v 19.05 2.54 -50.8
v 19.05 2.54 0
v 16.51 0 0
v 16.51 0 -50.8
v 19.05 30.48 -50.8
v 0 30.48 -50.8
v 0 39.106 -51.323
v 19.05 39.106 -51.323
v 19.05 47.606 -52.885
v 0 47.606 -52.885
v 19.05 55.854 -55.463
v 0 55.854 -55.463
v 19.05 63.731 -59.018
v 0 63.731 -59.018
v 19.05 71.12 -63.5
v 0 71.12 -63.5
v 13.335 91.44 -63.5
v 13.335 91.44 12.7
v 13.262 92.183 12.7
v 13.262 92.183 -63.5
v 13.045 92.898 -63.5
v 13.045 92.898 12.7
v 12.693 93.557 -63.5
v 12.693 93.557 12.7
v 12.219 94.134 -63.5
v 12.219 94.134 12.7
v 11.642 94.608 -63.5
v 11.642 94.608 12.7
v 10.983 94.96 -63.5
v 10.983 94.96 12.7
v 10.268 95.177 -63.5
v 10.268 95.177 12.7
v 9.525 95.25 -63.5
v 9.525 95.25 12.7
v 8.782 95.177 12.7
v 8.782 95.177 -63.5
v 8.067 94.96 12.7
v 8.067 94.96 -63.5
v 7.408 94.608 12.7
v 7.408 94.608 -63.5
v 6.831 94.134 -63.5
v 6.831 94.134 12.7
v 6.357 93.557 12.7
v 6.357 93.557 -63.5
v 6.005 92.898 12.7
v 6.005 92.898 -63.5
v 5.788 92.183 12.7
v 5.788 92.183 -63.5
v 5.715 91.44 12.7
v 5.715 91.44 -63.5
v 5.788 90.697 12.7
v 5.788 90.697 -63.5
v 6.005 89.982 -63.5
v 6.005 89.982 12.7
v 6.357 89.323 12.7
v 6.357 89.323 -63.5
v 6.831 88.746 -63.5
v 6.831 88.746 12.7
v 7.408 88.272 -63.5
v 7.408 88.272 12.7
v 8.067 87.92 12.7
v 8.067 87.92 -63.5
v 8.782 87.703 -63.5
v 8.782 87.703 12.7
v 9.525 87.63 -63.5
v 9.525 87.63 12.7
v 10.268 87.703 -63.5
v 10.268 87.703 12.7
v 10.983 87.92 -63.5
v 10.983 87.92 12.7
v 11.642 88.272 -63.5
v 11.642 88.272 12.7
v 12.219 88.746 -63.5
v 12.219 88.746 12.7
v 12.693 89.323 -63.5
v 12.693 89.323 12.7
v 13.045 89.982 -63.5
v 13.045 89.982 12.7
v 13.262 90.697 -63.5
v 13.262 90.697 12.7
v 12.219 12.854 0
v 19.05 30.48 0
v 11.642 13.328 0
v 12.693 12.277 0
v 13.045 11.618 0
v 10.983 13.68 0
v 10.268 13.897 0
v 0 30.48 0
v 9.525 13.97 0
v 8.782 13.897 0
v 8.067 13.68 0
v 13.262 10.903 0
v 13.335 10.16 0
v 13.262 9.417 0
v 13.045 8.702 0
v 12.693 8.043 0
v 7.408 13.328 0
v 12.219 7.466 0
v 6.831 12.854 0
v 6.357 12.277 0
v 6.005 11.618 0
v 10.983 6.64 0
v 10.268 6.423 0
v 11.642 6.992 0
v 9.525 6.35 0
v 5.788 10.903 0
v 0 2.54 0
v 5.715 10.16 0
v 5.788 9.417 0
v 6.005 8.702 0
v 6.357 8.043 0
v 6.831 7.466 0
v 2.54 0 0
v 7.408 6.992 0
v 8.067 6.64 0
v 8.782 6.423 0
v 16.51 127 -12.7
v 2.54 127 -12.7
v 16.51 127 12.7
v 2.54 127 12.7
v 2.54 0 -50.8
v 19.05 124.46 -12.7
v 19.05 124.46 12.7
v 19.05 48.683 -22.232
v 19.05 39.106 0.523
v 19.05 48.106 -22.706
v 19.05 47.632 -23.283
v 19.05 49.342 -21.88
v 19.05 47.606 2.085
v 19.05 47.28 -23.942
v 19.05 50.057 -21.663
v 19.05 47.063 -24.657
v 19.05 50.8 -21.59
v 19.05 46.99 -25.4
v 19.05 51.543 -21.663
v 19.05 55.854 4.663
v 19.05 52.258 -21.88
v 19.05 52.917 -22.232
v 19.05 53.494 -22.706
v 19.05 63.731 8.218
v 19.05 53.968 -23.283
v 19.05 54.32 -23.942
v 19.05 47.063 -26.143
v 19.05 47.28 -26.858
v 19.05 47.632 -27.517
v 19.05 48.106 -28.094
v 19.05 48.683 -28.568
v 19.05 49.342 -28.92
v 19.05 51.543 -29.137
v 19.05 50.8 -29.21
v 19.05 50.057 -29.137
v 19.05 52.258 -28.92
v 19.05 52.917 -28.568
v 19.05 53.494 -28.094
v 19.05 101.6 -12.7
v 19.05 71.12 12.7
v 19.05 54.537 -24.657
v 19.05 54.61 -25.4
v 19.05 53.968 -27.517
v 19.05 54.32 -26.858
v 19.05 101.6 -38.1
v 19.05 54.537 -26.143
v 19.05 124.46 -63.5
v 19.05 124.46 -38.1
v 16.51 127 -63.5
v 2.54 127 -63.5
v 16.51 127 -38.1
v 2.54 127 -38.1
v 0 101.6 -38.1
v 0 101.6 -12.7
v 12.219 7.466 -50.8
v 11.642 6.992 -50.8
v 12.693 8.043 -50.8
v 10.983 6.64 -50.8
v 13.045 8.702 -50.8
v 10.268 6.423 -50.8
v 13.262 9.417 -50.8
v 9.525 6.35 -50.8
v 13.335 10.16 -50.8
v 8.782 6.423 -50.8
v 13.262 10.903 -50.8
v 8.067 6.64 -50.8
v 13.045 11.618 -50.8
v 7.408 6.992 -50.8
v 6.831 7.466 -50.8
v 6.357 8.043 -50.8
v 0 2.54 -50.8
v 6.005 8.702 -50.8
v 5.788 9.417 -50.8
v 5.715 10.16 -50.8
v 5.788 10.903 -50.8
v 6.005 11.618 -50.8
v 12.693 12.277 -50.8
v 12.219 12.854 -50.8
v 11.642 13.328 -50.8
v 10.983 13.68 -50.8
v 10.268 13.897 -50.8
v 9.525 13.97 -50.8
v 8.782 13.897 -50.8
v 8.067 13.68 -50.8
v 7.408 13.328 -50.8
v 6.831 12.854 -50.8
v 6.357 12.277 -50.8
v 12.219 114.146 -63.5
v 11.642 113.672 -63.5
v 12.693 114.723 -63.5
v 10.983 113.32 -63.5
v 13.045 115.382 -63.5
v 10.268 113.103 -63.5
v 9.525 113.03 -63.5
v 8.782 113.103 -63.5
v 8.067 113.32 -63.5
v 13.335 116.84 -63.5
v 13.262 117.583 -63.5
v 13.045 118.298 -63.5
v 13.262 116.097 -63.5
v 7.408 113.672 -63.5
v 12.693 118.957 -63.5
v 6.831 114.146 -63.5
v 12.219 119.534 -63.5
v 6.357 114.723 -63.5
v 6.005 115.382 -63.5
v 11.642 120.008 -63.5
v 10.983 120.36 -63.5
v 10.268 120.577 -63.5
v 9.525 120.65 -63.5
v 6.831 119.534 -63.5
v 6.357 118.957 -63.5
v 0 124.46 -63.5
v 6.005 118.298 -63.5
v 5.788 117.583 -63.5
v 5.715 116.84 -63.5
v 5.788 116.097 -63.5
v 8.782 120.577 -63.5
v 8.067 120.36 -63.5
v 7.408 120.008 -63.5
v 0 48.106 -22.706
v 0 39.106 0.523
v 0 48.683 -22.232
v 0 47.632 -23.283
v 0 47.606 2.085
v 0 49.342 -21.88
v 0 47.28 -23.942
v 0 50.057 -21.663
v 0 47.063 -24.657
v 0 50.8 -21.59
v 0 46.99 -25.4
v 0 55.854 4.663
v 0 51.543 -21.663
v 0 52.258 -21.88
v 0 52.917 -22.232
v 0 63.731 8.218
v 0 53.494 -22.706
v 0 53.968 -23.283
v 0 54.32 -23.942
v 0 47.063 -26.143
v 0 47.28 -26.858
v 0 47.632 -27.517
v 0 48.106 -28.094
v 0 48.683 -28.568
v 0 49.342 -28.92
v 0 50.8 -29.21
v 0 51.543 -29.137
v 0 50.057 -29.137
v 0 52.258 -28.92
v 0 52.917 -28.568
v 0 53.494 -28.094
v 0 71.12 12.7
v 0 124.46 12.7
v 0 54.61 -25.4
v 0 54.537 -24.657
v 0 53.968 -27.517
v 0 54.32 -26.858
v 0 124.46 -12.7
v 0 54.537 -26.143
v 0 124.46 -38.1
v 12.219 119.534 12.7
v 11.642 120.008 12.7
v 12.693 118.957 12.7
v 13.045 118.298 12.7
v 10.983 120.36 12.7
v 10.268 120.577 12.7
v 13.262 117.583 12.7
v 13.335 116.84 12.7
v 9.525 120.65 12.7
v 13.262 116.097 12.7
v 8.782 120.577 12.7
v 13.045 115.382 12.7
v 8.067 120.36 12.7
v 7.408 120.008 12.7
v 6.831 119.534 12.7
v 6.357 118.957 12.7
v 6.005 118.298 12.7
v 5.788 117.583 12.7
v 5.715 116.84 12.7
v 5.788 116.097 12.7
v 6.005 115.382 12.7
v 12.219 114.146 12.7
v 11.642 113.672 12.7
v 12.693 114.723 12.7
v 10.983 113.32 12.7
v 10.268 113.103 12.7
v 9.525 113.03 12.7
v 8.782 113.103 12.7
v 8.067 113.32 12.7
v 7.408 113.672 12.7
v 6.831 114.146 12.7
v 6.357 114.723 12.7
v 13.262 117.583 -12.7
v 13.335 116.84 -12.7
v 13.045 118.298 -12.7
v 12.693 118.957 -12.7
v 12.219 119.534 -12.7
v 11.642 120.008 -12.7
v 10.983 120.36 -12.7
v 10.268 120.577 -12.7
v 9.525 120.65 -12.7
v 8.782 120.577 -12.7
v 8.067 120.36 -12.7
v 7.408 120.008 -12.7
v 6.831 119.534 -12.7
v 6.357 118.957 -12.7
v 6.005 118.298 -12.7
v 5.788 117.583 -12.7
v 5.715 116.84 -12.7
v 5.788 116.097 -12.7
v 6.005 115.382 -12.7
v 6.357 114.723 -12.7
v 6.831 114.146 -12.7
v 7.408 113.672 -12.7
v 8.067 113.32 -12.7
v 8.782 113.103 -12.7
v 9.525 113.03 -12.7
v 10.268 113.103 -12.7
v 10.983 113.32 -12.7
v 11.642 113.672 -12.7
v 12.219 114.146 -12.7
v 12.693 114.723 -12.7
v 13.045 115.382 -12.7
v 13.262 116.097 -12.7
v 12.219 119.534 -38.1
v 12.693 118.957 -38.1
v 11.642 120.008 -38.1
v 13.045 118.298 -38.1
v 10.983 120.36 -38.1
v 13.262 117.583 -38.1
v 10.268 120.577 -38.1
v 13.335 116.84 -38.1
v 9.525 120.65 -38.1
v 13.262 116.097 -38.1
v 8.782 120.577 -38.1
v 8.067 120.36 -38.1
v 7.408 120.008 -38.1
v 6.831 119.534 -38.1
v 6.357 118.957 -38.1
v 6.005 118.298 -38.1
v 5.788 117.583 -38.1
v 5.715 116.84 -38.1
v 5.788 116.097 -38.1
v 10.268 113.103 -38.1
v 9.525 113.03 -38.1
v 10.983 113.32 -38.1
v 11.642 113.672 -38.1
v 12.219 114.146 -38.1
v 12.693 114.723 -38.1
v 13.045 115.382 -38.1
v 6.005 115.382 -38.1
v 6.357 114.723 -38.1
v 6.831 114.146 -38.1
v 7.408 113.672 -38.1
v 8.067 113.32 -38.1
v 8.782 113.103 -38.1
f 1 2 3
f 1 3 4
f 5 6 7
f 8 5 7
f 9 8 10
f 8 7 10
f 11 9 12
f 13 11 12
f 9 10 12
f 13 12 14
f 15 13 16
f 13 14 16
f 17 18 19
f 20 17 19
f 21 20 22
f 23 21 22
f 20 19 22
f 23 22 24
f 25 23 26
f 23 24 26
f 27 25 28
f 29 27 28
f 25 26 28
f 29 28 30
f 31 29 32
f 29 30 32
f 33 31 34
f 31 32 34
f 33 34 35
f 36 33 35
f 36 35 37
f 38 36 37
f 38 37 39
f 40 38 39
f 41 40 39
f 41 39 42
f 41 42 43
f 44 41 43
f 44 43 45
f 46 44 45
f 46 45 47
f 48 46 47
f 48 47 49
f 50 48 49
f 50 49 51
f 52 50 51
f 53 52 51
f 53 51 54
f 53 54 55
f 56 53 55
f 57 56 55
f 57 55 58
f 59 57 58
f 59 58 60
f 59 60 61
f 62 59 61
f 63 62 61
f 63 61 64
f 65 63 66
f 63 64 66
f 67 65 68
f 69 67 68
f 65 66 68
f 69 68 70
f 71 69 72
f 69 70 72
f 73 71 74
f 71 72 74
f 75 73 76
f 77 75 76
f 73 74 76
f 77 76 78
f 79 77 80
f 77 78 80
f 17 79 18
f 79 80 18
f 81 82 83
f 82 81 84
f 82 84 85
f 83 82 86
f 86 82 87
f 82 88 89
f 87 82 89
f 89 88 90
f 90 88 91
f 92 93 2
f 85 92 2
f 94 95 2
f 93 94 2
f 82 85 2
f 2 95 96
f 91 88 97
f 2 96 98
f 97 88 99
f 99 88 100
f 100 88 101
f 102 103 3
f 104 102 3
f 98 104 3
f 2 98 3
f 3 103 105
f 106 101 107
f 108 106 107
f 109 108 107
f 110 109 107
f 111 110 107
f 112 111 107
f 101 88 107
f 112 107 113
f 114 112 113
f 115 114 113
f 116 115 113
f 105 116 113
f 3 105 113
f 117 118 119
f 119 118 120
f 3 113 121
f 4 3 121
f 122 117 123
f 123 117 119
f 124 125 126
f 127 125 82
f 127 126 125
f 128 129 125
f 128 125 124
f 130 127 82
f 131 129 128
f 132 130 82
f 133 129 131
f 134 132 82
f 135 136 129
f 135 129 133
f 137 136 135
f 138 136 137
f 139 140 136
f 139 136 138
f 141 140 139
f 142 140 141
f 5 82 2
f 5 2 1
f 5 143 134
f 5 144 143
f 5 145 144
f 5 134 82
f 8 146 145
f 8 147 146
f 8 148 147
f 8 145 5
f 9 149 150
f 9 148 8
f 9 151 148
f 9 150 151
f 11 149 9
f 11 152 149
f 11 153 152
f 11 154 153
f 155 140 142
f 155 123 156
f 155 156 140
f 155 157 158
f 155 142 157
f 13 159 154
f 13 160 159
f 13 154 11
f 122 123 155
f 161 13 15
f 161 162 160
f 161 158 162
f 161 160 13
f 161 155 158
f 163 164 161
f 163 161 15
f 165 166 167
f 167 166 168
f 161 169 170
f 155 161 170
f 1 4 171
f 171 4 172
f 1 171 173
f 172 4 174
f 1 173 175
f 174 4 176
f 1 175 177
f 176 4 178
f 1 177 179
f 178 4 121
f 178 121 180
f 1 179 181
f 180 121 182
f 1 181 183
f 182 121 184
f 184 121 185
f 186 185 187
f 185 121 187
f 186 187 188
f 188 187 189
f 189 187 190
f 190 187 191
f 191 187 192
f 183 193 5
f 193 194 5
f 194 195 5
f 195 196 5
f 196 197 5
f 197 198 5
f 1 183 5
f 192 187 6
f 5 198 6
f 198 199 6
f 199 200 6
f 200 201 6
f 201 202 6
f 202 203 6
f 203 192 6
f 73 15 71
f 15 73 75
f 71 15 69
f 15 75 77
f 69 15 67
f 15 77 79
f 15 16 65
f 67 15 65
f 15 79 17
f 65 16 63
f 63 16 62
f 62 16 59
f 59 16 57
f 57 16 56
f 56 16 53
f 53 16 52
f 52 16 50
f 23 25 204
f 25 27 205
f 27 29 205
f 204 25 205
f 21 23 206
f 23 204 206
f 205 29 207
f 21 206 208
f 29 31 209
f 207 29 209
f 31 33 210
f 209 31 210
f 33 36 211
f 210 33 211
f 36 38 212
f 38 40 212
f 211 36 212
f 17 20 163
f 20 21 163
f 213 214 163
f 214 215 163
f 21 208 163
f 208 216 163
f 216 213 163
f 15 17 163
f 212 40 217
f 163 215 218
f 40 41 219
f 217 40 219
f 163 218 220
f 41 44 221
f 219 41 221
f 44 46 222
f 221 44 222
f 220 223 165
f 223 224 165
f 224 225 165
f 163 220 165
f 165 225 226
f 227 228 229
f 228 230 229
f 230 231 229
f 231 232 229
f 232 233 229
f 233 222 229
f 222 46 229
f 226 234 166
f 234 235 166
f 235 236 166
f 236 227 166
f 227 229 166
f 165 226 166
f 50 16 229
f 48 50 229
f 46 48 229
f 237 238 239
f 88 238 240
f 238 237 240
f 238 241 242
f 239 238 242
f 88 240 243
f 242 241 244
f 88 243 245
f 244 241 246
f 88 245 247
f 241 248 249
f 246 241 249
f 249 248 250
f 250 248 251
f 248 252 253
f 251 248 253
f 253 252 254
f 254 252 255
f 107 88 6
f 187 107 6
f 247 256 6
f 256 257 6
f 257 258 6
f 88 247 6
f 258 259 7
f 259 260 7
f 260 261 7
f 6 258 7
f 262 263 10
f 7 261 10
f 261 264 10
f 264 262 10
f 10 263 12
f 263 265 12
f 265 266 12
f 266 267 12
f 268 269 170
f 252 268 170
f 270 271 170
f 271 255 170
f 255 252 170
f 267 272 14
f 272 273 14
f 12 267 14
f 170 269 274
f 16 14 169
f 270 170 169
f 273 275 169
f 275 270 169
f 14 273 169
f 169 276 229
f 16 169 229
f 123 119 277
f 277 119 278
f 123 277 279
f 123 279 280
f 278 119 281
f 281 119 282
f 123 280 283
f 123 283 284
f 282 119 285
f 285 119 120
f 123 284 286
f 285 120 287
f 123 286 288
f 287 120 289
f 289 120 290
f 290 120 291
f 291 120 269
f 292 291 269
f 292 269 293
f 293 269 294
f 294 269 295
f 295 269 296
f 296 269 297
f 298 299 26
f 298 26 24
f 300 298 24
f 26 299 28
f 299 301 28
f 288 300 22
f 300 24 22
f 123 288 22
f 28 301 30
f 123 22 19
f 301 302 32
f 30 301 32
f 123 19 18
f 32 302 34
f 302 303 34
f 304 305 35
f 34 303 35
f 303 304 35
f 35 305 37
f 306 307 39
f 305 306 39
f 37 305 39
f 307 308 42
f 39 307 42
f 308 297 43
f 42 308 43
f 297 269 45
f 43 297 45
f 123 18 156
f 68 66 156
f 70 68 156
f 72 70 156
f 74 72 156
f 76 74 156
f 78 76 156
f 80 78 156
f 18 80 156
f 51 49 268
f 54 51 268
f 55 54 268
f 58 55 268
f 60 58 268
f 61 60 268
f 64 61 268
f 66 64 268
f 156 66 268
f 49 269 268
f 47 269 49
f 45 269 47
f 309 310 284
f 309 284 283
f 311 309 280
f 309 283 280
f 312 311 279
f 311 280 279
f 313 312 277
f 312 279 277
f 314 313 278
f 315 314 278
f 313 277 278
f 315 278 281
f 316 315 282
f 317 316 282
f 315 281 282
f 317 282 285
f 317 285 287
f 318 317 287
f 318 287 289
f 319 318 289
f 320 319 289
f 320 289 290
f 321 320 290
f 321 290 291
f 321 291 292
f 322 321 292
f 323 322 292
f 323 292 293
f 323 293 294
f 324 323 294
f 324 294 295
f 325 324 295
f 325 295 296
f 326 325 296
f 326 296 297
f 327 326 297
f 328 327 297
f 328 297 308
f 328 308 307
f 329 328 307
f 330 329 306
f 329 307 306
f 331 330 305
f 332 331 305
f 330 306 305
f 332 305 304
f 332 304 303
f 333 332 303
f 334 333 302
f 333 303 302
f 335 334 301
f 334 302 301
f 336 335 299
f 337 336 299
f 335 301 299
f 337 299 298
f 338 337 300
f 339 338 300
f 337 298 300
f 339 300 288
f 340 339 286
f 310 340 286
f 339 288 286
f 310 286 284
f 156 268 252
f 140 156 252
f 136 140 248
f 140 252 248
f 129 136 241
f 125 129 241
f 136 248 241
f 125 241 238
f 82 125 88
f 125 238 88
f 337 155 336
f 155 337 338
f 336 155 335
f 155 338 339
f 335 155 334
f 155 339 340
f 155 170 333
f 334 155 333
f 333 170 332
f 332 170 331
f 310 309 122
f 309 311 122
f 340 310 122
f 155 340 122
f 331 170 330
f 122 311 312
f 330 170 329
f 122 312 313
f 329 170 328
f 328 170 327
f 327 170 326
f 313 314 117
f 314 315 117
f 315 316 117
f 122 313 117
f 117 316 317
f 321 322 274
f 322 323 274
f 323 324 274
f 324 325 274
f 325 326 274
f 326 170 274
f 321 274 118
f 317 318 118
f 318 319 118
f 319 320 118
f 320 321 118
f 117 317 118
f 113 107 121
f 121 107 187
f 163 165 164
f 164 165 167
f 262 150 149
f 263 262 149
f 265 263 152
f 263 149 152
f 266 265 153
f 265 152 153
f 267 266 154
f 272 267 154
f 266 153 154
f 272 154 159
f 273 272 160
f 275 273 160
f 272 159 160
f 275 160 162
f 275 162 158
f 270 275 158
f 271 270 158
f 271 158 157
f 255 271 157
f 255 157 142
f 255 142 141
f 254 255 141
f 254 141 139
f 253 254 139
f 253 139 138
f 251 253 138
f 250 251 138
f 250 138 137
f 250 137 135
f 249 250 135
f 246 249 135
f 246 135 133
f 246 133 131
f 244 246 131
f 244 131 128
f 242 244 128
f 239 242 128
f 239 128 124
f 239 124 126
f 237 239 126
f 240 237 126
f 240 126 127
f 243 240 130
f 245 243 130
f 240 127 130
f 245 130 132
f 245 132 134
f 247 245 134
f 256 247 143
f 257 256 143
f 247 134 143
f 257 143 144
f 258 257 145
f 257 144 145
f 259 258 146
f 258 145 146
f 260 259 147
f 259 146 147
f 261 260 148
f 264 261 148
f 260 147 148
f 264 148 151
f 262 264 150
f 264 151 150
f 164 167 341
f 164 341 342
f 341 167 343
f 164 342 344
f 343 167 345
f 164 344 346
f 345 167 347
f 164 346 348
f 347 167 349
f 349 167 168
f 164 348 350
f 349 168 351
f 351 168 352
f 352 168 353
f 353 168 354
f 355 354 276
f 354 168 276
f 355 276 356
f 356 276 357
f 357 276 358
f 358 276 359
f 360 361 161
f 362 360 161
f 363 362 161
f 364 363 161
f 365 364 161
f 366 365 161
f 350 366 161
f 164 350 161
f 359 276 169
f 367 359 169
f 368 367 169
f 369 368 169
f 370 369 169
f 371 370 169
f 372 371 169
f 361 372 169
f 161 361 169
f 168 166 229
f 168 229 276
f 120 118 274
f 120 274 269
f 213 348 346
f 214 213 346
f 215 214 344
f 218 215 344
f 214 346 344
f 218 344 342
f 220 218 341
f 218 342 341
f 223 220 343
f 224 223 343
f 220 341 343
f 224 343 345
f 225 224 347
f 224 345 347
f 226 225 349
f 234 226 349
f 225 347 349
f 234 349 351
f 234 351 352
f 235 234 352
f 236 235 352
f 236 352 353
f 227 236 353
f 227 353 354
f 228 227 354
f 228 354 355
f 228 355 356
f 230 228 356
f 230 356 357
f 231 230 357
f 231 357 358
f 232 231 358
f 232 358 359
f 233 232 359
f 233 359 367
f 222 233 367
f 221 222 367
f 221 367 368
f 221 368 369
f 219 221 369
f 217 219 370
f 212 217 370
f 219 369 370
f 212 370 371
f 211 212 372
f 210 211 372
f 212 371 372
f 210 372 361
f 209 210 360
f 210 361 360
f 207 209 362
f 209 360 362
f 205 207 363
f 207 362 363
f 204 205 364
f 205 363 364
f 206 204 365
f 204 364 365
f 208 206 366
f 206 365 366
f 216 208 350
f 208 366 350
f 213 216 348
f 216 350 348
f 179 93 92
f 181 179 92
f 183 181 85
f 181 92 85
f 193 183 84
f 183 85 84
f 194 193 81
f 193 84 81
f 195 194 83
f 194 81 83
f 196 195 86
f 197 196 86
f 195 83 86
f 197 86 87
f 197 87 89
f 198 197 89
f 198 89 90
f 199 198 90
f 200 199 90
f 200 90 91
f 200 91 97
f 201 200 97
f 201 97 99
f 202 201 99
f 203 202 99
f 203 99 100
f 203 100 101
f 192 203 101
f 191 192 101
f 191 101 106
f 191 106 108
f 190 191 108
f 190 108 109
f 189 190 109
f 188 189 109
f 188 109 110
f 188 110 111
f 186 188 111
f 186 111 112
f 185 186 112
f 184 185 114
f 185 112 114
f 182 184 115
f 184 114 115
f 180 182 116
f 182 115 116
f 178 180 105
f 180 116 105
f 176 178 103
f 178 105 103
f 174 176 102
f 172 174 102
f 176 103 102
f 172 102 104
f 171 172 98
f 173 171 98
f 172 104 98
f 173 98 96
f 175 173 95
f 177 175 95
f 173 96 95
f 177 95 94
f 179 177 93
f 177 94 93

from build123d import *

# Parameters (mm, degrees)
BOSS_EXTRUDE1_DEPTH = 19.05
SKETCH2_R           = 3.81
CUT_EXTRUDE1_DEPTH  = 77.2
SKETCH3_R           = 3.81
CUT_EXTRUDE2_DEPTH  = 20.05
CHAMFER1_SIZE       = 2.54


with BuildPart() as part:
    # Sketch1 → Boss-Extrude1 (new body)
    with BuildSketch(Plane(origin=(0, 0, 0), x_dir=(0, 0, -1), z_dir=(1, 0, 0))):
        with BuildLine():
            Line((50.8, 0), (50.8, 30.48))
            ThreePointArc((50.8, 30.48), (54.048946048, 51.76907936), (63.5, 71.12))
            Line((63.5, 71.12), (63.5, 127))
            Line((63.5, 127), (38.1, 127))
            Line((38.1, 127), (38.1, 101.6))
            Line((38.1, 101.6), (12.7, 101.6))
            Line((12.7, 101.6), (12.7, 127))
            Line((12.7, 127), (-12.7, 127))
            Line((-12.7, 127), (-12.7, 71.12))
            ThreePointArc((-12.7, 71.12), (-3.248946048, 51.76907936), (0, 30.48))
            Line((0, 30.48), (0, 0))
            Line((0, 0), (50.8, 0))
        make_face()
    extrude(amount=BOSS_EXTRUDE1_DEPTH)

    # Sketch2 → Cut-Extrude1 (cut, through all)
    with BuildSketch(Plane.XY.offset(12.7)):
        with Locations((9.525, 116.84)):
            Circle(SKETCH2_R)
        with Locations((9.525, 91.44)):
            Circle(SKETCH2_R)
        with Locations((9.525, 10.16)):
            Circle(SKETCH2_R)
    extrude(amount=-CUT_EXTRUDE1_DEPTH, mode=Mode.SUBTRACT)

    # Sketch3 → Cut-Extrude2 (cut, through all)
    with BuildSketch(Plane(origin=(19.05, 0, 0), x_dir=(0, 0, -1), z_dir=(1, 0, 0))):
        with Locations((25.4, 50.8)):
            Circle(SKETCH3_R)
    extrude(amount=-CUT_EXTRUDE2_DEPTH, mode=Mode.SUBTRACT)

    # Chamfer1
    chamfer1_edges = [part.edges().sort_by_distance(p)[0] for p in [
        (0, 127, 0),
        (0, 127, -50.8),
        (0, 0, -25.4),
        (19.05, 127, -50.8),
        (19.05, 127, 0),
        (19.05, 0, -25.4),
    ]]
    chamfer(chamfer1_edges, length=CHAMFER1_SIZE)


solid = part.part
